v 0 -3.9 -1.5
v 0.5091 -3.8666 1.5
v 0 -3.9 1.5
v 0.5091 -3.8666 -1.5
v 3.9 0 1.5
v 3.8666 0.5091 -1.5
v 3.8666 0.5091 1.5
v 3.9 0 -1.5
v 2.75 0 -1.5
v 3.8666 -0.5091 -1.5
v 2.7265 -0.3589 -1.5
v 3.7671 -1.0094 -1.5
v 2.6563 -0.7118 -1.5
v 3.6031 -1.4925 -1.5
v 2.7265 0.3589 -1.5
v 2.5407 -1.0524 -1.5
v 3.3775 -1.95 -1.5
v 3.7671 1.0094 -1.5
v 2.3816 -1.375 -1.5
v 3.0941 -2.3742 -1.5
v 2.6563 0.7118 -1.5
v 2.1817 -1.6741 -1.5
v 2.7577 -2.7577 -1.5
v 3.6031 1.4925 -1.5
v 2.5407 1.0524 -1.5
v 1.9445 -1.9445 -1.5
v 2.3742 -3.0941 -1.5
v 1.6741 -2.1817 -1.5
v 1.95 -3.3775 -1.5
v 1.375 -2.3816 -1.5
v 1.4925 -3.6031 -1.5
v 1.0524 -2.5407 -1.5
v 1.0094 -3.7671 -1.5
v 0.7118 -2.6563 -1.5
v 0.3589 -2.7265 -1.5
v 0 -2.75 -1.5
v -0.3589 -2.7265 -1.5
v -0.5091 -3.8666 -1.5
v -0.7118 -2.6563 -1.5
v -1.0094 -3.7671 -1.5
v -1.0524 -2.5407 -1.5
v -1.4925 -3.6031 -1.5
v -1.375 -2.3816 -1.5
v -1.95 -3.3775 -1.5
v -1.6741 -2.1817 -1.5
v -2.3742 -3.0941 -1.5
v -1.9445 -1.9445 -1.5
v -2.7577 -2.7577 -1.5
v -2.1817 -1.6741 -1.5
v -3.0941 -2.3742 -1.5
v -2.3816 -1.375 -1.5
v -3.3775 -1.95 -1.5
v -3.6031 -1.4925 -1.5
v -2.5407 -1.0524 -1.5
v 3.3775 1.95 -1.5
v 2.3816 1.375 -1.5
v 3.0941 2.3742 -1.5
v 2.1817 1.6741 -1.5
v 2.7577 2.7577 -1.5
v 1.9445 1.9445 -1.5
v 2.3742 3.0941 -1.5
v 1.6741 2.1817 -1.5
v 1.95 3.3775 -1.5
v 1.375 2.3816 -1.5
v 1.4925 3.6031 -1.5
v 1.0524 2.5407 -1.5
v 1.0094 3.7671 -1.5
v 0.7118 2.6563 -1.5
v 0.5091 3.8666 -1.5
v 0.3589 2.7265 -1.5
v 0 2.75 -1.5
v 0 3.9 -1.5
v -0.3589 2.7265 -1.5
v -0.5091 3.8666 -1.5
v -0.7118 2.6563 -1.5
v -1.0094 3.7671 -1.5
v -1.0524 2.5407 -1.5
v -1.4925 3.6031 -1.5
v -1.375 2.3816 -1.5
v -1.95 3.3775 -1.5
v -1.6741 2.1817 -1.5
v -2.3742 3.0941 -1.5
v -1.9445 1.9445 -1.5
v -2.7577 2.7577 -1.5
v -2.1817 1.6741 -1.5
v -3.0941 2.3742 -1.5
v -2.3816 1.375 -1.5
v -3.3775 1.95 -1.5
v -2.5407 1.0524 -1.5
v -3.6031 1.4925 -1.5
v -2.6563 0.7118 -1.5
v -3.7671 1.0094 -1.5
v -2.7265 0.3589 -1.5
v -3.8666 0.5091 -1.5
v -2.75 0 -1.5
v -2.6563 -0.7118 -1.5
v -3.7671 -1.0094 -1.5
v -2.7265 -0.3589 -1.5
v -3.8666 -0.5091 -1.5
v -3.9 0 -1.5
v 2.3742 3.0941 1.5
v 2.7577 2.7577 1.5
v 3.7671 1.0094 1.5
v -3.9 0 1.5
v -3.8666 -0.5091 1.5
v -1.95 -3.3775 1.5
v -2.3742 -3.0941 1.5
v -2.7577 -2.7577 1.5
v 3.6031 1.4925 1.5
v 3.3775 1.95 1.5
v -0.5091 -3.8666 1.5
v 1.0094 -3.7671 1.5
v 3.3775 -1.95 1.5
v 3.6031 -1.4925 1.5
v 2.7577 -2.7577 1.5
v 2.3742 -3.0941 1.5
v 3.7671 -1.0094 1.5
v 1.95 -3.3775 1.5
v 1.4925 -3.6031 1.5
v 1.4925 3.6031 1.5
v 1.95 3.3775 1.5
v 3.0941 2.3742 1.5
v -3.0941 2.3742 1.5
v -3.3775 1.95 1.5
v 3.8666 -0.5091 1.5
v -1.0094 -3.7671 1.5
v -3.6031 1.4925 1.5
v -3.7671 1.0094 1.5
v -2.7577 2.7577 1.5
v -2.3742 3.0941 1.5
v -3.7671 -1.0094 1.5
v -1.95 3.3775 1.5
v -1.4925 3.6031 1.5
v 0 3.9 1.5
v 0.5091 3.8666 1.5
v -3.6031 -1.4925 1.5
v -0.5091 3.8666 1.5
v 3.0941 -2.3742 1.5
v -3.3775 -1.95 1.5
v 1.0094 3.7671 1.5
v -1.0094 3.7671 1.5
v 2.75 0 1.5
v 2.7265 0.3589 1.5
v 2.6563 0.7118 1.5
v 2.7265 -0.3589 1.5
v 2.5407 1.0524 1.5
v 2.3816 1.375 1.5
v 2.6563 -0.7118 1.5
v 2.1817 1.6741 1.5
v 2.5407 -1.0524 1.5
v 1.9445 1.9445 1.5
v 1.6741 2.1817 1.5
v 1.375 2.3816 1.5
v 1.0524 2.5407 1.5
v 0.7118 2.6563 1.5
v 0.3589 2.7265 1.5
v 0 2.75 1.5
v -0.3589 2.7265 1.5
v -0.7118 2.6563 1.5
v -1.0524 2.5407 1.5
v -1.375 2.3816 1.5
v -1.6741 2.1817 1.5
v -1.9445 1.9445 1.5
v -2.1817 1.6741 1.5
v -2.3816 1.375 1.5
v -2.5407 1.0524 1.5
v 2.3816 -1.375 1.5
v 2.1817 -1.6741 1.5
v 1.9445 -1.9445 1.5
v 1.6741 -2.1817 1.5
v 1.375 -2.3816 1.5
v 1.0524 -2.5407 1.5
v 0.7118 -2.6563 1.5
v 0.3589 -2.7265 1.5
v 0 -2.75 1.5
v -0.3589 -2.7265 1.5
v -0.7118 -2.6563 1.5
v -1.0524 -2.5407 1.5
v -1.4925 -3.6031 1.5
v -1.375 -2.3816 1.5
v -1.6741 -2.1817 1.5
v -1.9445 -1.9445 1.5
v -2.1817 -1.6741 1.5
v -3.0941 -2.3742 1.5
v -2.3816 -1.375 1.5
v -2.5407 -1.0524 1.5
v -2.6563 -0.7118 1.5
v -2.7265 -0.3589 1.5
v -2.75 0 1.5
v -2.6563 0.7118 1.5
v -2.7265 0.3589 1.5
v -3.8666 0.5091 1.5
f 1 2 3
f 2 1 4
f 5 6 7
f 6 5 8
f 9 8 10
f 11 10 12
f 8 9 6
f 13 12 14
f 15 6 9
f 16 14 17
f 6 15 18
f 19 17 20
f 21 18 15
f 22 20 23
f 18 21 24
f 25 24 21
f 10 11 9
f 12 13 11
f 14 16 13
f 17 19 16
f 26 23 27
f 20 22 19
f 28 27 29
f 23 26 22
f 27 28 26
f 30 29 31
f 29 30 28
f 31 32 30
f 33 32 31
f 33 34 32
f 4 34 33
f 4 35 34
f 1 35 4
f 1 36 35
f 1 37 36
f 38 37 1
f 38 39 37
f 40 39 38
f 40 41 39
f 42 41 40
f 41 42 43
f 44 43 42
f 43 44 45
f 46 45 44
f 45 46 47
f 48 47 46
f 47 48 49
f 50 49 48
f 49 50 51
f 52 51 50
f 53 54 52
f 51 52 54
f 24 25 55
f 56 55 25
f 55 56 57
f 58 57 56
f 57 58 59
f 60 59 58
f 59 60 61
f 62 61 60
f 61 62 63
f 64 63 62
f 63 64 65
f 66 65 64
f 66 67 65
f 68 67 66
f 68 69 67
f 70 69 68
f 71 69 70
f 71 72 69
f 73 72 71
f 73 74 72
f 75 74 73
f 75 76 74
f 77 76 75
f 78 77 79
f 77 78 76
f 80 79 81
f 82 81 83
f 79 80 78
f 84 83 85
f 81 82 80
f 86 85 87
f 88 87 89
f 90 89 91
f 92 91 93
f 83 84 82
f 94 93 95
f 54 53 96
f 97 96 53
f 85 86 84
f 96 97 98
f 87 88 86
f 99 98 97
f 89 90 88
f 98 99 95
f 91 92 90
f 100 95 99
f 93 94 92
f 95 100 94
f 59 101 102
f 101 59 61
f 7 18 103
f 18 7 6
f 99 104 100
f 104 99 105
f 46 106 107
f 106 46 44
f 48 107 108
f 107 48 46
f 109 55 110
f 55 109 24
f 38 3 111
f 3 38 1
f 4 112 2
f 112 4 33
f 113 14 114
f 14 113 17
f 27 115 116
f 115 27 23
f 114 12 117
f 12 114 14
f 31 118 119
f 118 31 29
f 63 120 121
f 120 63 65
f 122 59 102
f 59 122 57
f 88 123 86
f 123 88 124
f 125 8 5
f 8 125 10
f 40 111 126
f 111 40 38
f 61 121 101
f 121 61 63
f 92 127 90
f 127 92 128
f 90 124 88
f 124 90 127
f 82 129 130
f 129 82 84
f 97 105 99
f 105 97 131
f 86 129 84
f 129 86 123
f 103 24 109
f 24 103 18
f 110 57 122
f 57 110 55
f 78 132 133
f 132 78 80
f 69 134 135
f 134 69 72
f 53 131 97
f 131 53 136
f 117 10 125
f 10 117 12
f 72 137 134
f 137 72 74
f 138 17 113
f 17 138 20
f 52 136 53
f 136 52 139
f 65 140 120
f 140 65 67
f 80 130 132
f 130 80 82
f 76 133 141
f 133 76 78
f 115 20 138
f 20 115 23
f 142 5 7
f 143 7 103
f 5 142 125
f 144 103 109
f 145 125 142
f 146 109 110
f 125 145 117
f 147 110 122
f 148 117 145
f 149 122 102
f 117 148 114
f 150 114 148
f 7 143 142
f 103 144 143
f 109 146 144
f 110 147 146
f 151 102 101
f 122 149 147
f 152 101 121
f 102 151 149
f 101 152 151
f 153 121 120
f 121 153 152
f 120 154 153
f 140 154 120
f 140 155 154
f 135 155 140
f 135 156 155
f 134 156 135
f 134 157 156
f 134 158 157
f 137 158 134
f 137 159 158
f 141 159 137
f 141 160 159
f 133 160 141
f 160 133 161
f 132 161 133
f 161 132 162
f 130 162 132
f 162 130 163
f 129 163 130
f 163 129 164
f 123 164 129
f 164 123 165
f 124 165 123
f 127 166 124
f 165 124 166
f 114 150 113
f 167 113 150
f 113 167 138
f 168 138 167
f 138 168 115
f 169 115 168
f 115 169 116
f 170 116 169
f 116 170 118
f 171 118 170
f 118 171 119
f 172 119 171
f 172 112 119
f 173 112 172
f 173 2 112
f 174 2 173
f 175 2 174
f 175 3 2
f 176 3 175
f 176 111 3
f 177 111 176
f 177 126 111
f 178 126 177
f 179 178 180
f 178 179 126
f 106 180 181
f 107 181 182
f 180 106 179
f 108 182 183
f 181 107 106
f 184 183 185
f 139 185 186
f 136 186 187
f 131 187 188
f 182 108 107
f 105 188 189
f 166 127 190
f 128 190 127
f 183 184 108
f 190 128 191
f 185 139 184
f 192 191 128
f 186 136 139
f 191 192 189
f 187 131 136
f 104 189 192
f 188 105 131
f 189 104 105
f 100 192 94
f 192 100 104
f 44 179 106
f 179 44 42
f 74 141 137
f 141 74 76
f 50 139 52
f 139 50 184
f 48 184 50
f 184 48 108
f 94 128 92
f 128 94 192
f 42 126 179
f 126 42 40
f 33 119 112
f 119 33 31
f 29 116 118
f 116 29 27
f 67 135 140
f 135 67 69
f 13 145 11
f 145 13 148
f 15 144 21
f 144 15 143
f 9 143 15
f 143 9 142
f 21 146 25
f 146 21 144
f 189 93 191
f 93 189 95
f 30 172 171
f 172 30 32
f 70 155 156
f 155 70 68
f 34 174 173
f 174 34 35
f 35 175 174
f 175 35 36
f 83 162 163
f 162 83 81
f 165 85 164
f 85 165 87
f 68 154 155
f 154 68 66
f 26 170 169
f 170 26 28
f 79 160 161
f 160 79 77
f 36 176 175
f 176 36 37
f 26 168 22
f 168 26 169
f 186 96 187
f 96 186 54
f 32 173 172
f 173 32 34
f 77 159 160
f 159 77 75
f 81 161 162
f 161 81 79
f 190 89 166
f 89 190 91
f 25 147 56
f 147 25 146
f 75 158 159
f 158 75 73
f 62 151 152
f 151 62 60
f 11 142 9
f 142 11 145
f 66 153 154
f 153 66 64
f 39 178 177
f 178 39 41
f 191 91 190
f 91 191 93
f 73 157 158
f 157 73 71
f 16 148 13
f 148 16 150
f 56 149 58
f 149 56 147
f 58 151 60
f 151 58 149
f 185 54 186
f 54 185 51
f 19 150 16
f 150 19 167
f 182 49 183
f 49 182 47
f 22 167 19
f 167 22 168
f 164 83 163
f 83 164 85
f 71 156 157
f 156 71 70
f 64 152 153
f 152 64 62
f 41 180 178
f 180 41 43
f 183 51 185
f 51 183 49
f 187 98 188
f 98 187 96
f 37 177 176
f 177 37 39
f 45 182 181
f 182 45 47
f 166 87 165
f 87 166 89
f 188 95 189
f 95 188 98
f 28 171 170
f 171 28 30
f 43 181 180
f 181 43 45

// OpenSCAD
difference()
{
	cylinder(d=7.8,h=3,center=true,$fn=24*2);
	cylinder(d=5.5,h=3+0.2,center=true,$fn=24*2);
}
